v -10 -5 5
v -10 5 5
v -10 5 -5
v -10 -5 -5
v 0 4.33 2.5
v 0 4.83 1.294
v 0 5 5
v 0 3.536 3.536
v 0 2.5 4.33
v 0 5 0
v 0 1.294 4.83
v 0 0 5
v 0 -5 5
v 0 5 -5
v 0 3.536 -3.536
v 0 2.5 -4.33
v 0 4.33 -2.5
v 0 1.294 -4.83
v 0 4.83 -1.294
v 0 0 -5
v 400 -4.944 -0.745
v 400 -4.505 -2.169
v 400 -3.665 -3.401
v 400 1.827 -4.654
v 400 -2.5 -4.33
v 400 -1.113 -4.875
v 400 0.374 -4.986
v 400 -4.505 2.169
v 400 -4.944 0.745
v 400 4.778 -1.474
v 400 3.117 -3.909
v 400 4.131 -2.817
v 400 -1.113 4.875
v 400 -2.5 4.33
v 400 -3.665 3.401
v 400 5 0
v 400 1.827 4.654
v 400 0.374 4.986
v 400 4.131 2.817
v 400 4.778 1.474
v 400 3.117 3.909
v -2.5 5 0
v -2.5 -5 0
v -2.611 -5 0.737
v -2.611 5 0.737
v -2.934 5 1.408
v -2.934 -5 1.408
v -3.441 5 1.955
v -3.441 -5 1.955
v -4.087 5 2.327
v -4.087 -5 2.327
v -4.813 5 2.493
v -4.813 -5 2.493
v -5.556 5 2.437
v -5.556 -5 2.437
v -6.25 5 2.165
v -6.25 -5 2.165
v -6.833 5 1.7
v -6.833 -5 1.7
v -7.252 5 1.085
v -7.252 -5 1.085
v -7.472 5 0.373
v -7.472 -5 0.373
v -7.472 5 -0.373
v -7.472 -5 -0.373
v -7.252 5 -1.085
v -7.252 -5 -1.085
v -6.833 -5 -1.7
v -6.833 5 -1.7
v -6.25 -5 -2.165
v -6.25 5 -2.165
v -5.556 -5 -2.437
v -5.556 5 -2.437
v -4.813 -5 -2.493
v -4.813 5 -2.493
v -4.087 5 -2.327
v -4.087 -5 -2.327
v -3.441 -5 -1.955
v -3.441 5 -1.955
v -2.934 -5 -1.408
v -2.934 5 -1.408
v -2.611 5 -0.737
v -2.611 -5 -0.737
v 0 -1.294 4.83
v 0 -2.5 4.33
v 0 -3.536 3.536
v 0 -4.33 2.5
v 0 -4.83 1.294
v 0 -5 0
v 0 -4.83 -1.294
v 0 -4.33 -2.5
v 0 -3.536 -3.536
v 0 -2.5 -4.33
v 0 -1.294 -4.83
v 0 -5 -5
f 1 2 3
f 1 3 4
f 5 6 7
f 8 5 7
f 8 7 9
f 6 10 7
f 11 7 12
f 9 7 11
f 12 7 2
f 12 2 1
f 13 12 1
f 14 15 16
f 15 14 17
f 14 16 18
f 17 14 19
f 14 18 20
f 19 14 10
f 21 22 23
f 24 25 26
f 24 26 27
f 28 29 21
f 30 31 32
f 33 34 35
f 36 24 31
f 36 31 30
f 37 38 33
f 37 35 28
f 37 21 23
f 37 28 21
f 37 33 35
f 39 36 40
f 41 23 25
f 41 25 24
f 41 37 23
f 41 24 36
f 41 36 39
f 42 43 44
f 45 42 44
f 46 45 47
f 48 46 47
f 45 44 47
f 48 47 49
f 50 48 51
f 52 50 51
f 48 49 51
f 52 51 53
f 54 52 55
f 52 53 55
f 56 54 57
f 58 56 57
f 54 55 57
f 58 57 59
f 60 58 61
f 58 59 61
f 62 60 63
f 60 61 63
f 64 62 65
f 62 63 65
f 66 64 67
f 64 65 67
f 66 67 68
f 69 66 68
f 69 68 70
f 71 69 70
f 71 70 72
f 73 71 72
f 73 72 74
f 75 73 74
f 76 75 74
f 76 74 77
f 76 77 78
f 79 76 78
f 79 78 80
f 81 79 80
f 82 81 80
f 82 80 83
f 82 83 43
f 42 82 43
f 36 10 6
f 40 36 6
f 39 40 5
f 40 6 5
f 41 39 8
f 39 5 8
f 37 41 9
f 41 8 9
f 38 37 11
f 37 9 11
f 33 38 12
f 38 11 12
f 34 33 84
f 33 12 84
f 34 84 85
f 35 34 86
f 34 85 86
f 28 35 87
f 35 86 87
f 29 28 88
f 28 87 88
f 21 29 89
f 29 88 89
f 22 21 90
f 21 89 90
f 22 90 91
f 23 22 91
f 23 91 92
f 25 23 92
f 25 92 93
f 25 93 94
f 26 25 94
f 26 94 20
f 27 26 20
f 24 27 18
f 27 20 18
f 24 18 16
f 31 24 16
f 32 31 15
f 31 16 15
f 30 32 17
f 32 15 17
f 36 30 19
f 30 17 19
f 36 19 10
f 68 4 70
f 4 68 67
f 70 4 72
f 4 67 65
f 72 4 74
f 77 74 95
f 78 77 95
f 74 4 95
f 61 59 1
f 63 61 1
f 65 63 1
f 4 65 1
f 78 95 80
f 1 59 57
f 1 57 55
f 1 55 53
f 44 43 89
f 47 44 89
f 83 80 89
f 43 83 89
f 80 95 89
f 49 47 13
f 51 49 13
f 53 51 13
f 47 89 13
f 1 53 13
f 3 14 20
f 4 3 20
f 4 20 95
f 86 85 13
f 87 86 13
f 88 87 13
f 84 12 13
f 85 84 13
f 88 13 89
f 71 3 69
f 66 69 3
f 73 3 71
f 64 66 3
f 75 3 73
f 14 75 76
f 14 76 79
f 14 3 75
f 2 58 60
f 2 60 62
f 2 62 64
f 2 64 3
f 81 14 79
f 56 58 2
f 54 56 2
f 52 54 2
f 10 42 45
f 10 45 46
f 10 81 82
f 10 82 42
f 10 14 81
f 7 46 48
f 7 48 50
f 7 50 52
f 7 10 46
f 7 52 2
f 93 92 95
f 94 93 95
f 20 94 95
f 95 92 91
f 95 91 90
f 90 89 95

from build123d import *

# Parameters (mm, degrees)
F0_R     = 5
F1_DEPTH = 400
F2_W     = 10
F2_H     = 10
F3_DEPTH = 10
F4_R     = 2.5
F5_DEPTH = 25


with BuildPart() as f1:
    # F0 (on Right) → F1 (new body)
    with BuildSketch(Plane.YZ):
        Circle(F0_R)
    extrude(amount=F1_DEPTH)

    # F2 (on face) → F3 (join)
    with BuildSketch(Plane(origin=(0, 0, 0), x_dir=(0, -1, 0), z_dir=(-1, 0, 0))):
        Rectangle(F2_W, F2_H)
    extrude(amount=F3_DEPTH)

    # F4 (on face) → F5 (cut)
    with BuildSketch(Plane.XZ.offset(5)):
        with Locations((-5, 0)):
            Circle(F4_R)
    extrude(amount=-F5_DEPTH, mode=Mode.SUBTRACT)


solid = f1.part
